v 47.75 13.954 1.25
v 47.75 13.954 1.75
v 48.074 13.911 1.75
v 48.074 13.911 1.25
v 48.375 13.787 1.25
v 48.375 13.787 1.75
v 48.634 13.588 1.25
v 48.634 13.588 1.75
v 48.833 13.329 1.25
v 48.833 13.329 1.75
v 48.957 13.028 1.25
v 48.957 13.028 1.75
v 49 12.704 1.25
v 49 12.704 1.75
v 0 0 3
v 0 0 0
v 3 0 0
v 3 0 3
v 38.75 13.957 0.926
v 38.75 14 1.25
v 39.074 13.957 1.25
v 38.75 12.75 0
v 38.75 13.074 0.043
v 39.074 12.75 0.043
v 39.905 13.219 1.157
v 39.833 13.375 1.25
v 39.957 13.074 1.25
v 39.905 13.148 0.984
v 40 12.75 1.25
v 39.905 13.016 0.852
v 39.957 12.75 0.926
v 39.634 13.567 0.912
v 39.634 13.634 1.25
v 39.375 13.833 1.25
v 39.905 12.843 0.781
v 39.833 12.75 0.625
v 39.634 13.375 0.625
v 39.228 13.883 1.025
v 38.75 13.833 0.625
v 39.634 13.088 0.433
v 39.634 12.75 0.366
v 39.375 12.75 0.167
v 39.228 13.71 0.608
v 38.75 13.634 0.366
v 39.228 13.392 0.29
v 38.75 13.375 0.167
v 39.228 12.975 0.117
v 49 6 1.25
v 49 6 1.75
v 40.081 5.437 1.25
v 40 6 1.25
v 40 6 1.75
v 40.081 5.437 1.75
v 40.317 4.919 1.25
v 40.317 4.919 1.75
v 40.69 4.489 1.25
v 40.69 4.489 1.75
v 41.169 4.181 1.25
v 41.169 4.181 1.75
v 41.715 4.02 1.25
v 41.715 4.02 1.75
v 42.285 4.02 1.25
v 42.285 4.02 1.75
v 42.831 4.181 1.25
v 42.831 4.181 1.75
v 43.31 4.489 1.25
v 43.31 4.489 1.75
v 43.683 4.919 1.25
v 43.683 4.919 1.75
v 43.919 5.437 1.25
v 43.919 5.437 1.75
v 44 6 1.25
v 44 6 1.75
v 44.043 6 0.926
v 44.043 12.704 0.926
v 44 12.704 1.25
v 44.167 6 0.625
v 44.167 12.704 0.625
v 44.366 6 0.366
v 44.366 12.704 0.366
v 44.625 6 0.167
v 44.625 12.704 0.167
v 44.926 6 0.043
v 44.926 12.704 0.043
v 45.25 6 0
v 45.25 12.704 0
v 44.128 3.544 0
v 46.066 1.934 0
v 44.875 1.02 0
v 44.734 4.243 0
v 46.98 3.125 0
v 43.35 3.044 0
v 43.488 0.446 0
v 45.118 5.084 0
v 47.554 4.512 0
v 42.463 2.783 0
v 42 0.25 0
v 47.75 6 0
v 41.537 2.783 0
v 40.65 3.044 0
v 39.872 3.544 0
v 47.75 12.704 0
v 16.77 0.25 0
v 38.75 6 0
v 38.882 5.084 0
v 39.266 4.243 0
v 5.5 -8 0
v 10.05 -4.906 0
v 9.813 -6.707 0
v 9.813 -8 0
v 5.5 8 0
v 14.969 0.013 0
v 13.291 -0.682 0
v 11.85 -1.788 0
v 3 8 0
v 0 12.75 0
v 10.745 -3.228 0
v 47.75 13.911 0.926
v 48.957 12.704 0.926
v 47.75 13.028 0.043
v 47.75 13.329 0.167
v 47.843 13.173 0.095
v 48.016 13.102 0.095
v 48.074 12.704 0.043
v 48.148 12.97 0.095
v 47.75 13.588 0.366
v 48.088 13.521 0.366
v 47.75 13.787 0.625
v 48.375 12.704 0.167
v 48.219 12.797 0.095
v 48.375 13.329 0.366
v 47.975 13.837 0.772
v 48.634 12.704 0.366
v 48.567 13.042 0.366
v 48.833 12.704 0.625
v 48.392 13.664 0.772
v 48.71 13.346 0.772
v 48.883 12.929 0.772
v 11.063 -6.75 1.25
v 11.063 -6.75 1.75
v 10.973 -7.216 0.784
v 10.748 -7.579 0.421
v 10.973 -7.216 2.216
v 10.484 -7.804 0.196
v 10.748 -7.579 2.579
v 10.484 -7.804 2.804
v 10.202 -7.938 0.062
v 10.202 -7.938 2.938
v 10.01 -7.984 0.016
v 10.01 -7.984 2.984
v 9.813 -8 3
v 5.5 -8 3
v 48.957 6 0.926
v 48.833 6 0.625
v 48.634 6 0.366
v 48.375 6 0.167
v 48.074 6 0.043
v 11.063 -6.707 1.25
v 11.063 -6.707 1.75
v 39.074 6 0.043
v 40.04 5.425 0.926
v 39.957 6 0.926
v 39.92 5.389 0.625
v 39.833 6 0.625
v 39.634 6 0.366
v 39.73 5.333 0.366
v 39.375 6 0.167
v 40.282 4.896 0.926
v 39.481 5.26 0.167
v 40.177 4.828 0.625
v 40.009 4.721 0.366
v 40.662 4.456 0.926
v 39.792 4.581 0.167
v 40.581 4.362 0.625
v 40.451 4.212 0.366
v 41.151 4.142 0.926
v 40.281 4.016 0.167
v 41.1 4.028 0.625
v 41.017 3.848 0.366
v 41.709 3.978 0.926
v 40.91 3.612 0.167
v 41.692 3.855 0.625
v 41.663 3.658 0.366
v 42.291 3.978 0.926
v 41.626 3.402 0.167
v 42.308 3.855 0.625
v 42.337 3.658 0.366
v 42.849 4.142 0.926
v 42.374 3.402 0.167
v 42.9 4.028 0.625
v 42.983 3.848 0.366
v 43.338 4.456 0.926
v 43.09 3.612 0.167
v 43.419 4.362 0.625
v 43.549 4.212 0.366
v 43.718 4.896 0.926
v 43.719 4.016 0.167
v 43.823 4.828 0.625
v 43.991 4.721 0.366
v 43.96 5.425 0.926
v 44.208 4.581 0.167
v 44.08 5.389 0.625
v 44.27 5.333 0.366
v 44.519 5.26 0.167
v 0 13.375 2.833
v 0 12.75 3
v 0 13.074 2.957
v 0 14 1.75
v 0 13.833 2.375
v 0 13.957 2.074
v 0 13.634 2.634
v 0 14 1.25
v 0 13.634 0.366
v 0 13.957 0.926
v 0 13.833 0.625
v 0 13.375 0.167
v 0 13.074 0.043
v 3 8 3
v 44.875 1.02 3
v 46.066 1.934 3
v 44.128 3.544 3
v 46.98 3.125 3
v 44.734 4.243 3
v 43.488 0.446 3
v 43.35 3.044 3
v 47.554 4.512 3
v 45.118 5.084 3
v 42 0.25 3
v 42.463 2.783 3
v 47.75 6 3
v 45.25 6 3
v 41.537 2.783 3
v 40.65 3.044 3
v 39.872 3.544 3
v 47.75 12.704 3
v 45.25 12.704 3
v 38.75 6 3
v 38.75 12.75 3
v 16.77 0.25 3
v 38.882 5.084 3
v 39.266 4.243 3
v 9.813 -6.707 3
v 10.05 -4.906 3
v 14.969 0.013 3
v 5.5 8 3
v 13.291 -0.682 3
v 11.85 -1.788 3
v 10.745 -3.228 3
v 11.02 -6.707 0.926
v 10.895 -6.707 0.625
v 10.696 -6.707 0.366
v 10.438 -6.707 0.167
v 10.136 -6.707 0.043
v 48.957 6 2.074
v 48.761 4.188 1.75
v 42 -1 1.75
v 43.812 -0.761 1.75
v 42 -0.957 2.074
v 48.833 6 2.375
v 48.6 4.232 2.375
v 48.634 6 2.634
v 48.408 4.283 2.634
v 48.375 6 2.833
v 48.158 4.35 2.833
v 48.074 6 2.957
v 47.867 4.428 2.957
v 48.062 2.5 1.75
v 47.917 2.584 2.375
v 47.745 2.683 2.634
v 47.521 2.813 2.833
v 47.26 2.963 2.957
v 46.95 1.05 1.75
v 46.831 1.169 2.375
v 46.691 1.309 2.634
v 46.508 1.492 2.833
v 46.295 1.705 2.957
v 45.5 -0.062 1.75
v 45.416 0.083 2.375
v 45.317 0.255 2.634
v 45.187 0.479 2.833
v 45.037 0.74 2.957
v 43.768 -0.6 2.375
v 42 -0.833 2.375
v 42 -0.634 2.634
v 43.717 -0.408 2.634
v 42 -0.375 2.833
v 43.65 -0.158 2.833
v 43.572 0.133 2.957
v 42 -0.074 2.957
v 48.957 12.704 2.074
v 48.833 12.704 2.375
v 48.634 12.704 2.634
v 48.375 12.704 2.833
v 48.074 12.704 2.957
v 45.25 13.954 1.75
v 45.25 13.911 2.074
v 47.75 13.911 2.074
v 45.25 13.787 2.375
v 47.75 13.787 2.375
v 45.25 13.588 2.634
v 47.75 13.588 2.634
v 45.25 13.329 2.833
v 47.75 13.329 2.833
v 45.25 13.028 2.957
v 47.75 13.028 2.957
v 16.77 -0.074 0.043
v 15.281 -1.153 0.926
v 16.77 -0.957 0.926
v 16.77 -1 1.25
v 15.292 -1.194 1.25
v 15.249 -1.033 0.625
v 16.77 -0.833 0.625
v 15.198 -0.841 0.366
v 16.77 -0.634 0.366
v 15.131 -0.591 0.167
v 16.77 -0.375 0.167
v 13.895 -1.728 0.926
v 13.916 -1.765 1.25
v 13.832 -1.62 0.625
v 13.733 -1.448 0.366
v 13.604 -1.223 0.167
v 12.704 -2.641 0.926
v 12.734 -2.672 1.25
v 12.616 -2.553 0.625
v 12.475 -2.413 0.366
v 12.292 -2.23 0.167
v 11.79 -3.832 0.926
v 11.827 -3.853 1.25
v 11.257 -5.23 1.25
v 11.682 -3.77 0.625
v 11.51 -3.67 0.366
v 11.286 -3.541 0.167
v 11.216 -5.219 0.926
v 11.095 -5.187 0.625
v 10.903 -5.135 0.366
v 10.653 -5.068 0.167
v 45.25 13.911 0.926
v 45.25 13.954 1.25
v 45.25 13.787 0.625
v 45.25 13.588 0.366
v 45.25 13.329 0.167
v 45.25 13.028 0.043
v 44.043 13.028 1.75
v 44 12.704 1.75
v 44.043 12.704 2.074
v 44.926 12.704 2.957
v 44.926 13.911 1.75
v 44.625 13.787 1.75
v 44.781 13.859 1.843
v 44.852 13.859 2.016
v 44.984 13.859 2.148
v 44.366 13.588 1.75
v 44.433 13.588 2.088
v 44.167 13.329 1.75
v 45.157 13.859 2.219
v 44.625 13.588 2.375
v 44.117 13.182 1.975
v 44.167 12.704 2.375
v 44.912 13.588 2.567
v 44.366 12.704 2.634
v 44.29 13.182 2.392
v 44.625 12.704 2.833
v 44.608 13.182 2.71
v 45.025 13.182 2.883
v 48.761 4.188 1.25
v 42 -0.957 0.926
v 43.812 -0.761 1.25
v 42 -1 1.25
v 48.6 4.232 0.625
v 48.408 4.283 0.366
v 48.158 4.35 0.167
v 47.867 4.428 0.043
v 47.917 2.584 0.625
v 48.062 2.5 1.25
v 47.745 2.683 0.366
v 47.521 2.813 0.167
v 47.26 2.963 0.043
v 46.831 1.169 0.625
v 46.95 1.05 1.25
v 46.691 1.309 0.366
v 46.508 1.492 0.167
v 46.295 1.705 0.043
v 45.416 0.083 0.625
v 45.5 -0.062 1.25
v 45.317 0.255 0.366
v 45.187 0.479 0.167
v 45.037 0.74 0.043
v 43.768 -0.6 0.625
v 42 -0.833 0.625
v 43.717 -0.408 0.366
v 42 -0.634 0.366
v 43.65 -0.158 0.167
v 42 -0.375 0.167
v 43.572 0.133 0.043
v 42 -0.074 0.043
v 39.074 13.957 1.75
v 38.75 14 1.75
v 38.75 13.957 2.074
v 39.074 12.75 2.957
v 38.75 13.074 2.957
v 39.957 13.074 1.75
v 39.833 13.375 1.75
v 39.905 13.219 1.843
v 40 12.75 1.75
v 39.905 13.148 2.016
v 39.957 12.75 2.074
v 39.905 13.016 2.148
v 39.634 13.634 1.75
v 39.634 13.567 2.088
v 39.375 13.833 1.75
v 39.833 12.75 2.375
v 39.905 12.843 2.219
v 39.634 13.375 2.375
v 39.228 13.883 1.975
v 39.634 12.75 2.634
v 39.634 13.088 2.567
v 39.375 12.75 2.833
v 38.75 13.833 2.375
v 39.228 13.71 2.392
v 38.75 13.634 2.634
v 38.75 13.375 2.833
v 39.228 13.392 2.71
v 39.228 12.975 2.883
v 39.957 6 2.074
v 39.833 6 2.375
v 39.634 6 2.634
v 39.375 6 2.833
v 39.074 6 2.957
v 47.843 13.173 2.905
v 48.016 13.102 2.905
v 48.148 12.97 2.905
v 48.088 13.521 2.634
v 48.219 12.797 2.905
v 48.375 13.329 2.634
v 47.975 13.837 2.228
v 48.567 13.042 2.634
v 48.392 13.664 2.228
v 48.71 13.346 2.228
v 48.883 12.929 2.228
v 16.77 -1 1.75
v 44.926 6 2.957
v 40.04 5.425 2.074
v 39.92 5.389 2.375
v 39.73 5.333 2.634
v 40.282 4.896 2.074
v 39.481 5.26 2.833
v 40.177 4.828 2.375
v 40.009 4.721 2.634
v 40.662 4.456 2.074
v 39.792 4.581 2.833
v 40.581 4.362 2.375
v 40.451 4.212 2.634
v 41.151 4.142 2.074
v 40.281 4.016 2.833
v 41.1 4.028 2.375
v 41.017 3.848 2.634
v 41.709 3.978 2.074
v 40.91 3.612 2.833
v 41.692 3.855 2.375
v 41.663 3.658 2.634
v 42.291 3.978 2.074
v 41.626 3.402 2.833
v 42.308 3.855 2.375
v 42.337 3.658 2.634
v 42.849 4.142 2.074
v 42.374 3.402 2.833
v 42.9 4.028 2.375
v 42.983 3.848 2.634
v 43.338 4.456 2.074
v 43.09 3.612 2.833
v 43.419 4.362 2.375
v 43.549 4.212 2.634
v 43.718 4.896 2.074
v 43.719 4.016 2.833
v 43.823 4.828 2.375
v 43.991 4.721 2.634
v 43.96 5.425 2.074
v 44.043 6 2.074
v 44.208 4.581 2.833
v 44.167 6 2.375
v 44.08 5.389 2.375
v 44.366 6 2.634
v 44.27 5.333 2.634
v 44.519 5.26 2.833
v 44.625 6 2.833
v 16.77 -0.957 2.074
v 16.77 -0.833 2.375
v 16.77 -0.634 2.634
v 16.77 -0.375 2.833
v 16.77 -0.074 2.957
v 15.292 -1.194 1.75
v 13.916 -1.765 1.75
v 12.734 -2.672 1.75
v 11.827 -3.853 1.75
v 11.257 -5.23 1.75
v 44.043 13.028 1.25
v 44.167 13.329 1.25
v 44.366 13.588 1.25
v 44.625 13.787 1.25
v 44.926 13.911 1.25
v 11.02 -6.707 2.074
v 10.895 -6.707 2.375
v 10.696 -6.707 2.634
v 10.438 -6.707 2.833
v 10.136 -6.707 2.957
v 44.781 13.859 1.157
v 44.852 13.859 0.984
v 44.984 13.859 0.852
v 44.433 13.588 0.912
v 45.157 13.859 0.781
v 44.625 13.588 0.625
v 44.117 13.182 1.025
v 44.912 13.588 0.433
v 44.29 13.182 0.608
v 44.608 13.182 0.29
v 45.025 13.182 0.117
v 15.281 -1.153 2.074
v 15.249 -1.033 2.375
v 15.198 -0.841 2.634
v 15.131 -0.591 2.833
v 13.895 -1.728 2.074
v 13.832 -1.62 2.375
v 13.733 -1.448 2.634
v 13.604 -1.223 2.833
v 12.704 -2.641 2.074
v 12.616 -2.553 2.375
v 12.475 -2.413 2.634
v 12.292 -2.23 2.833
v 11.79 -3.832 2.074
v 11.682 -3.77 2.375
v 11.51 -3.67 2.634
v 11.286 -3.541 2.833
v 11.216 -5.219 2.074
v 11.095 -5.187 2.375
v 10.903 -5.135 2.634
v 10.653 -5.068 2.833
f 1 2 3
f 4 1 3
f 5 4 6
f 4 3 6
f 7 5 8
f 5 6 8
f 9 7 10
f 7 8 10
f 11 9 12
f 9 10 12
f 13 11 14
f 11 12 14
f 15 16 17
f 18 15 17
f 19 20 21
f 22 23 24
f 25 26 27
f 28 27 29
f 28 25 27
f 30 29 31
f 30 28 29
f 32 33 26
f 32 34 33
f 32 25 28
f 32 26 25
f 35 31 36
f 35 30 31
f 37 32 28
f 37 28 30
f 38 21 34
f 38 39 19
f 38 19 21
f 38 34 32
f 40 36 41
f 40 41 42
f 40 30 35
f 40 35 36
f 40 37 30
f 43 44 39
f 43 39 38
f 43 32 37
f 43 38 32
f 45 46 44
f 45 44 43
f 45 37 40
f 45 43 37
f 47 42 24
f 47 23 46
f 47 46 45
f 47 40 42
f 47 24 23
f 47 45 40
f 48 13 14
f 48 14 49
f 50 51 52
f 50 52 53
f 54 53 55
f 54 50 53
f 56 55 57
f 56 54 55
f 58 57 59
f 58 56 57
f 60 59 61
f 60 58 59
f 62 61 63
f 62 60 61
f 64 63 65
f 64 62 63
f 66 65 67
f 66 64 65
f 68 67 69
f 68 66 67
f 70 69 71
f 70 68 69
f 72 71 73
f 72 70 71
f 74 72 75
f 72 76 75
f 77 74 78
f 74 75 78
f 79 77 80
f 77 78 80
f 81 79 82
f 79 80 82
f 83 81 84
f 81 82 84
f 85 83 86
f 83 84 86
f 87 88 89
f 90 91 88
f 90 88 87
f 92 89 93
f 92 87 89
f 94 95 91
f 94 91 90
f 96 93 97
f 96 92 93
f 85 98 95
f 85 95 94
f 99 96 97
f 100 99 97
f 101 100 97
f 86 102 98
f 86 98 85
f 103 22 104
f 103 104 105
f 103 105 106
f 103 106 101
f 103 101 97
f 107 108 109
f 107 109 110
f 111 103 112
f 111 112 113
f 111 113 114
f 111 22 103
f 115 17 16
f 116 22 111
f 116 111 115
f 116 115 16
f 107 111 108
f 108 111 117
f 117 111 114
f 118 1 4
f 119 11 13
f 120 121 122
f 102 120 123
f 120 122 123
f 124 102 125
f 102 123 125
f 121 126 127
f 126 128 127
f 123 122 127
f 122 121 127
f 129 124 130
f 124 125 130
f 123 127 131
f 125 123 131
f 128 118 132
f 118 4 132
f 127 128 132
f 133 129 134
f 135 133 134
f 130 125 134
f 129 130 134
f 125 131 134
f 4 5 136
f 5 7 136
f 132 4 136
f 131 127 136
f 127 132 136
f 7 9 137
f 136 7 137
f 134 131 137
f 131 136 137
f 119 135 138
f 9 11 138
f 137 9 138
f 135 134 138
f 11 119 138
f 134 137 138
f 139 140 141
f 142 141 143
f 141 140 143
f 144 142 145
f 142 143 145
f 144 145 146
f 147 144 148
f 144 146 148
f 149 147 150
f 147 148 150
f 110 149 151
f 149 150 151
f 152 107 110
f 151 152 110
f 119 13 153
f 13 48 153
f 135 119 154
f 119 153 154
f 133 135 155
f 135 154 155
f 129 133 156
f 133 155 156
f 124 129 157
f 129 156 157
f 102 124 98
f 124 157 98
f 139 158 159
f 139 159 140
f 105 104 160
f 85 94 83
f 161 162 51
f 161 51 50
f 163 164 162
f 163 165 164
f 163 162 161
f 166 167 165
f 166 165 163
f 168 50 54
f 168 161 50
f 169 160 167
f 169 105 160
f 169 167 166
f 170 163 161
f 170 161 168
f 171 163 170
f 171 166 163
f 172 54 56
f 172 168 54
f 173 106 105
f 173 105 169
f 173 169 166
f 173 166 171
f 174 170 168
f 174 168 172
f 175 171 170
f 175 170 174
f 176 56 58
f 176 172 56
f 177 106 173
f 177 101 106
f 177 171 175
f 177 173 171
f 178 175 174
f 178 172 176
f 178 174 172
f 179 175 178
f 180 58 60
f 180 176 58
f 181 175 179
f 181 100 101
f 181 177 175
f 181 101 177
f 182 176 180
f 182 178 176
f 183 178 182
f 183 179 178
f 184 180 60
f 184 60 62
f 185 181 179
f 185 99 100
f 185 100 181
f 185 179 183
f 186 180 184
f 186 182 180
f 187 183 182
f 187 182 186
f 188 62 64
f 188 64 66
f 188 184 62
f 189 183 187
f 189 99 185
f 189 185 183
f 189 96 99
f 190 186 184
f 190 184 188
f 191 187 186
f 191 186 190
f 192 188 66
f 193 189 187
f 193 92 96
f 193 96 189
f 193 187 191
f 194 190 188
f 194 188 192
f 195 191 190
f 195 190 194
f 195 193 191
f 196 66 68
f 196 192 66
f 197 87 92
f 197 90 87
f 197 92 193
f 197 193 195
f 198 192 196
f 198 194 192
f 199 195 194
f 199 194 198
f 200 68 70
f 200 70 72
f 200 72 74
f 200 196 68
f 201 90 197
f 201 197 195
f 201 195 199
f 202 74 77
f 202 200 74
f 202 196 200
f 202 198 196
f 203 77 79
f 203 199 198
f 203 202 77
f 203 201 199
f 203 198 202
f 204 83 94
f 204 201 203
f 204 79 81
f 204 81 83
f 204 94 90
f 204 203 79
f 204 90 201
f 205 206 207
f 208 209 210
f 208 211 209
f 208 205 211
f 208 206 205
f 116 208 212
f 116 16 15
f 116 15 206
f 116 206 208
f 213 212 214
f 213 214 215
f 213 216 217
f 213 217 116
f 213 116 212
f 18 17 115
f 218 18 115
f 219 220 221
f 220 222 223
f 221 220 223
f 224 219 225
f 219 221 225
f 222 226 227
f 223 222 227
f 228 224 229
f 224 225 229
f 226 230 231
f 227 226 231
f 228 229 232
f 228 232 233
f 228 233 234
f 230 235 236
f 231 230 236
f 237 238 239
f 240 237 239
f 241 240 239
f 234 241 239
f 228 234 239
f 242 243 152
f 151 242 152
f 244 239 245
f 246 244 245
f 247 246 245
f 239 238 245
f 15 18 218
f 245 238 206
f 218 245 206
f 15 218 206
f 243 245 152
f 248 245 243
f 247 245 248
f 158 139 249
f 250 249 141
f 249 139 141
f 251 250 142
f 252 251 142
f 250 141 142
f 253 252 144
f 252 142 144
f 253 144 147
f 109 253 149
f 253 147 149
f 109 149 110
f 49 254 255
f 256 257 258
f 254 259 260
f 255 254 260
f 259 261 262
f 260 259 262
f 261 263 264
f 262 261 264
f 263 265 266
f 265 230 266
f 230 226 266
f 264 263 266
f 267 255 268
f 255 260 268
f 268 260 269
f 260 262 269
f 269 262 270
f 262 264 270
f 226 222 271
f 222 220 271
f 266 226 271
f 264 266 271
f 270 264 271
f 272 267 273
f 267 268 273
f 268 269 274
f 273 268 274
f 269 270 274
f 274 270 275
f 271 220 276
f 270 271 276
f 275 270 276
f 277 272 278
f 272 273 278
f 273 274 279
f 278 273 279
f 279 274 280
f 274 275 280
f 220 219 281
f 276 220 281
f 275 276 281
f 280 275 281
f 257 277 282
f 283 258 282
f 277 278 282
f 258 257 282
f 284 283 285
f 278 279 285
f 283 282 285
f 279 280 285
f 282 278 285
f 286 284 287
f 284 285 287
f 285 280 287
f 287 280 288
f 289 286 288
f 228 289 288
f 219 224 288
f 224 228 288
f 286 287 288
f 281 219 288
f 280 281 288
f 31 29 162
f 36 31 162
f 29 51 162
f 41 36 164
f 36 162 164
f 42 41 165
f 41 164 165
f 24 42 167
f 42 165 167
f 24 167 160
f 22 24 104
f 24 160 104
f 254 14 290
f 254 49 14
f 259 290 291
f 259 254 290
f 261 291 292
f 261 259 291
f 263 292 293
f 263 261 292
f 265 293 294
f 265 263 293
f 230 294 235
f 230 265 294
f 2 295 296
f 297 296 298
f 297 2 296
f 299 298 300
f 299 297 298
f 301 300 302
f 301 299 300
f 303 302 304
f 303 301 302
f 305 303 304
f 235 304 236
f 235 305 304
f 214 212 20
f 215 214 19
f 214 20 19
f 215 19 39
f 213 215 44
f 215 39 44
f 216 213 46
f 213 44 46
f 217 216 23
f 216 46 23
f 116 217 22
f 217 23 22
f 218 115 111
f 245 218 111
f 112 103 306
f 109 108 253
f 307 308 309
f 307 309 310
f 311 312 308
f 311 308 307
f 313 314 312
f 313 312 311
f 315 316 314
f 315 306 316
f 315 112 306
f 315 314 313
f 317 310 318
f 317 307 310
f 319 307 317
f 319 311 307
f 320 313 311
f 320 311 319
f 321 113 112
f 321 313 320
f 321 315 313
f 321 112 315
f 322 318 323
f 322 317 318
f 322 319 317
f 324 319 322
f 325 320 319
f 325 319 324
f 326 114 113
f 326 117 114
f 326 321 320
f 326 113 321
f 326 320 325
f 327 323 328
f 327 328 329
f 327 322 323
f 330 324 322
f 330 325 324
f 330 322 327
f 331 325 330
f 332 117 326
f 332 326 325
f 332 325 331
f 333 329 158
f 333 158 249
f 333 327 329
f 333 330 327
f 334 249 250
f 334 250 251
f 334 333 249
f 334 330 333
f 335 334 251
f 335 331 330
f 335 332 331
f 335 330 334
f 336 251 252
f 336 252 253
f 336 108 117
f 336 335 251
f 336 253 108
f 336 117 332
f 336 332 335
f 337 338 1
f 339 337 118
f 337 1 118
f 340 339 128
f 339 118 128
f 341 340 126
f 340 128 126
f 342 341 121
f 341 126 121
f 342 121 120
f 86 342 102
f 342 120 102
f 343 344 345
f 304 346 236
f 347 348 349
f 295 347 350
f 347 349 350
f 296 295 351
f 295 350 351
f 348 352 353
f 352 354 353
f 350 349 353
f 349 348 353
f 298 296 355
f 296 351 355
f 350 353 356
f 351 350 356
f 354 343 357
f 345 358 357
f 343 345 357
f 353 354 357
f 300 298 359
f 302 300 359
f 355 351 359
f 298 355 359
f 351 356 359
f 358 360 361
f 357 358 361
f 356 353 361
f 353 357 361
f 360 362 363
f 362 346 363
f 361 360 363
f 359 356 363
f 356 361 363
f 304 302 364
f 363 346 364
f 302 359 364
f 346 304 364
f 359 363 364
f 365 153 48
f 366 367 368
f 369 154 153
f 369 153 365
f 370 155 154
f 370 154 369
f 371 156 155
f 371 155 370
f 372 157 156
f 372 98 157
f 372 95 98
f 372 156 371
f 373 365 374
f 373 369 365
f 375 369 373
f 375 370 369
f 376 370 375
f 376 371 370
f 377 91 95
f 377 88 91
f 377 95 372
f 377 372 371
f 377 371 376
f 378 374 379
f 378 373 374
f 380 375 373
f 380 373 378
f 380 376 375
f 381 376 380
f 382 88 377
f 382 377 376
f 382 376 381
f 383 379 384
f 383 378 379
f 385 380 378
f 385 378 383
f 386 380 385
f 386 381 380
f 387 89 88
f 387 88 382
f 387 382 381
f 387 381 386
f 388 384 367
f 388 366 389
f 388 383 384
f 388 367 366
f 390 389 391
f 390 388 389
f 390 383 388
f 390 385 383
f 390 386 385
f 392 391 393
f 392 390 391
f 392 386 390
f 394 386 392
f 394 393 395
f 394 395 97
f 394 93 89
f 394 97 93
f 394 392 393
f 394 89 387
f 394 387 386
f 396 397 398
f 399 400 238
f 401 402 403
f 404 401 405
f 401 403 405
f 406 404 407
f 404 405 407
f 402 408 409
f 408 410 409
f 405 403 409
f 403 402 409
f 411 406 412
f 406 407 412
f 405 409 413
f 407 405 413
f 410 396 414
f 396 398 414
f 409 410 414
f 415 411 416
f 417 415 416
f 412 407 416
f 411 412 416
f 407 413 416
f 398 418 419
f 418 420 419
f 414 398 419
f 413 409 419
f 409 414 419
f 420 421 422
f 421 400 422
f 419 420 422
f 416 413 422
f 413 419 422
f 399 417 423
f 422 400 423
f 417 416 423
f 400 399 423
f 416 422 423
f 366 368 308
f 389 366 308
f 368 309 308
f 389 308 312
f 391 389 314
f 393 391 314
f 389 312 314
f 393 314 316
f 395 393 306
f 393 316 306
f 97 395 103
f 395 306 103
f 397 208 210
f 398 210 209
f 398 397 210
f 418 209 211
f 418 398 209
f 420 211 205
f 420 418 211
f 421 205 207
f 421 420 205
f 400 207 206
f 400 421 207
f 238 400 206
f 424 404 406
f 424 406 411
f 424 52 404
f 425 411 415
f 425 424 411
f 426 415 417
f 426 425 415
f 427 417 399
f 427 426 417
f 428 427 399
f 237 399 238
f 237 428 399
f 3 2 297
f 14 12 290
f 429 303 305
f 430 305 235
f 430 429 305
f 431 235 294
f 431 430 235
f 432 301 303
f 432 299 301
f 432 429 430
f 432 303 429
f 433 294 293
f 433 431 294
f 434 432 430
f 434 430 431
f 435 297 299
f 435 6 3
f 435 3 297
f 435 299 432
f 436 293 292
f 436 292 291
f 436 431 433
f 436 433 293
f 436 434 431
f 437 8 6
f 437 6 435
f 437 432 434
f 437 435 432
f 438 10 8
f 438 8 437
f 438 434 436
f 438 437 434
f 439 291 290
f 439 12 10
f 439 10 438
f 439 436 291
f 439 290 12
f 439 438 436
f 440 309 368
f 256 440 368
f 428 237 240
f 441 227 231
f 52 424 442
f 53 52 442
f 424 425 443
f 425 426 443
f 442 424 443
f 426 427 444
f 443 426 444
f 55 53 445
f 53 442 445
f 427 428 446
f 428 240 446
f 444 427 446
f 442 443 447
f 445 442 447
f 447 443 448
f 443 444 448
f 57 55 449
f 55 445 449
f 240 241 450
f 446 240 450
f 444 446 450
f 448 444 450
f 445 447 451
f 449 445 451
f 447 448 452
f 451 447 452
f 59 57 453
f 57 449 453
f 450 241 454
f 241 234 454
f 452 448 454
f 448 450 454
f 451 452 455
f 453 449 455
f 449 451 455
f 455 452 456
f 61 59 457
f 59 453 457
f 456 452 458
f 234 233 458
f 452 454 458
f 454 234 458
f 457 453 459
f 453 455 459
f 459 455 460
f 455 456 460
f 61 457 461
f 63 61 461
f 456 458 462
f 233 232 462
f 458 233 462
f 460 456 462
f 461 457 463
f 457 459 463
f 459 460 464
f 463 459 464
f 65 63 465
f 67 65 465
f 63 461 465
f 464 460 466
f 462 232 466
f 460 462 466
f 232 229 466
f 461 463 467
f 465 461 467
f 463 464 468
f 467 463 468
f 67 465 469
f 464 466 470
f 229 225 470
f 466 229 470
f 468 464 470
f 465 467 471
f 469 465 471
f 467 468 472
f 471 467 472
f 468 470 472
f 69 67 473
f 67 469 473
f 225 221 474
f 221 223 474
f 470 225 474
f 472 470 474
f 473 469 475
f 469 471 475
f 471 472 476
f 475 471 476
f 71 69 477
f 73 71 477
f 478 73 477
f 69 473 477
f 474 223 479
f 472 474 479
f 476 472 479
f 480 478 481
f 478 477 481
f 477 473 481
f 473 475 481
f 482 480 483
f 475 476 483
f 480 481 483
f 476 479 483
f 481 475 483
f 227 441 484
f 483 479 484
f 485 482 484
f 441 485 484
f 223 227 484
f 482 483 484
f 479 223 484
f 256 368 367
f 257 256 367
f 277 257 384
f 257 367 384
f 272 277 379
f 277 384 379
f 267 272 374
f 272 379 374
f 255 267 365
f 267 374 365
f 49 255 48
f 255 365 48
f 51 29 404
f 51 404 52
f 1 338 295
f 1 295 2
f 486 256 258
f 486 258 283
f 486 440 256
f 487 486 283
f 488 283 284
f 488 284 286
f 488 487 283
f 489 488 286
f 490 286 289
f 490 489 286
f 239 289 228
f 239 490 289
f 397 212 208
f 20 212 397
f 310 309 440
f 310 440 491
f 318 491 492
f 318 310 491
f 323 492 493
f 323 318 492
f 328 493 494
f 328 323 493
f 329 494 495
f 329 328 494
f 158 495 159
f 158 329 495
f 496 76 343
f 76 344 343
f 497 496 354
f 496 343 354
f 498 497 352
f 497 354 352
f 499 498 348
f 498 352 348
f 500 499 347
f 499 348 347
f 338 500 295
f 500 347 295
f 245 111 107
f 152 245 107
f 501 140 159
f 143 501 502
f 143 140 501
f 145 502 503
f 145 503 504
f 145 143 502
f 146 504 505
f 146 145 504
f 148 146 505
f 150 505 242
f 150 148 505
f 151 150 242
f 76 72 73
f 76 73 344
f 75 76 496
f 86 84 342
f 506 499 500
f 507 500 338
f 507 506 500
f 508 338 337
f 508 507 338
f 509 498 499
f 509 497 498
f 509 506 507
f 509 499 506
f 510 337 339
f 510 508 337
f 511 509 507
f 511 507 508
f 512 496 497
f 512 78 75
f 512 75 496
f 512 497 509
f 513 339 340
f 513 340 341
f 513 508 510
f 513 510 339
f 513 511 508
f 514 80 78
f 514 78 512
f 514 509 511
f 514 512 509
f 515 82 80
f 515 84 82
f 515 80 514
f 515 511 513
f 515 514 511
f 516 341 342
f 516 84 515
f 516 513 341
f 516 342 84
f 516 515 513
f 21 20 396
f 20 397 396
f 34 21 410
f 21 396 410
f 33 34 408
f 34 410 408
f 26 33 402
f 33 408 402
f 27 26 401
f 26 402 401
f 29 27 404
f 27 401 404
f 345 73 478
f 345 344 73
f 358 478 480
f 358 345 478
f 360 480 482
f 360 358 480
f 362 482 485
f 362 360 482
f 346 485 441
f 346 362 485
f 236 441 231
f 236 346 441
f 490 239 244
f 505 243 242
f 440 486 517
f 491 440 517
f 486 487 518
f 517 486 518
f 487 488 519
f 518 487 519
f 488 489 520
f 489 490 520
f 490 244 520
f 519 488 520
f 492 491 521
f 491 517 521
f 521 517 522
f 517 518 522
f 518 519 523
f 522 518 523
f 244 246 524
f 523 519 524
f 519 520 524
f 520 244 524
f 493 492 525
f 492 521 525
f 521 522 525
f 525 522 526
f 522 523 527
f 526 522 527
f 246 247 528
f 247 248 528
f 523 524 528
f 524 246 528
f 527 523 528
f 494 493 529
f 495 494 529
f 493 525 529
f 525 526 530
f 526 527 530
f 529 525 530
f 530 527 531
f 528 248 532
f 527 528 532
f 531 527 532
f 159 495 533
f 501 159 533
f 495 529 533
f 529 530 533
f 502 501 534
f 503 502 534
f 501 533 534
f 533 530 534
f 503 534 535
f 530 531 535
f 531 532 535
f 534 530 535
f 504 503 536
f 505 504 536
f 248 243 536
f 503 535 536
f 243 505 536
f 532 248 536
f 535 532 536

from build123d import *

# Parameters (mm, degrees)
PAD_DEPTH = 3
FILLET_R  = 1.25


with BuildPart() as part:
    # Sketch → Pad (new body)
    with BuildSketch(Plane.XY):
        with BuildLine():
            Line((0, 0), (0, 14))
            Line((0, 14), (40, 14))
            Line((40, 14), (40, 6))
            ThreePointArc((40, 6), (42, 4), (44, 6))
            Line((44, 6), (44, 13.953997))
            Line((44, 13.953997), (49, 13.953997))
            Line((49, 13.953997), (49, 6))
            ThreePointArc((42, -1), (46.949747, 1.050253), (49, 6))
            Line((16.769501, -1), (42, -1))
            ThreePointArc((16.769501, -1), (12.734056, -2.671536), (11.06252, -6.706981))
            Line((11.06252, -6.706981), (11.06252, -8))
            Line((5.5, -8), (11.06252, -8))
            Line((5.5, 8), (5.5, -8))
            Line((3, 8), (5.5, 8))
            Line((3, 0), (3, 8))
            Line((0, 0), (3, 0))
        make_face()
    extrude(amount=PAD_DEPTH)

    # Fillet
    fillet_edges = [part.edges().sort_by_distance(p)[0] for p in [
        (20, 14, 3),
        (20, 14, 0),
        (40, 14, 1.5),
        (40, 10, 0),
        (40, 10, 3),
        (42, 4, 0),
        (42, 4, 3),
        (44, 13.953997, 1.5),
        (44, 9.976998, 0),
        (44, 9.976998, 3),
        (49, 13.953997, 1.5),
        (46.5, 13.953997, 0),
        (46.5, 13.953997, 3),
        (49, 9.976998, 0),
        (49, 9.976998, 3),
        (46.949747, 1.050253, 0),
        (46.949747, 1.050253, 3),
        (29.38475, -1, 0),
        (29.38475, -1, 3),
        (12.734056, -2.671536, 0),
        (12.734056, -2.671536, 3),
        (11.06252, -8, 1.5),
        (11.06252, -7.353491, 0),
        (11.06252, -7.353491, 3),
    ]]
    fillet(fillet_edges, radius=FILLET_R)


solid = part.part
